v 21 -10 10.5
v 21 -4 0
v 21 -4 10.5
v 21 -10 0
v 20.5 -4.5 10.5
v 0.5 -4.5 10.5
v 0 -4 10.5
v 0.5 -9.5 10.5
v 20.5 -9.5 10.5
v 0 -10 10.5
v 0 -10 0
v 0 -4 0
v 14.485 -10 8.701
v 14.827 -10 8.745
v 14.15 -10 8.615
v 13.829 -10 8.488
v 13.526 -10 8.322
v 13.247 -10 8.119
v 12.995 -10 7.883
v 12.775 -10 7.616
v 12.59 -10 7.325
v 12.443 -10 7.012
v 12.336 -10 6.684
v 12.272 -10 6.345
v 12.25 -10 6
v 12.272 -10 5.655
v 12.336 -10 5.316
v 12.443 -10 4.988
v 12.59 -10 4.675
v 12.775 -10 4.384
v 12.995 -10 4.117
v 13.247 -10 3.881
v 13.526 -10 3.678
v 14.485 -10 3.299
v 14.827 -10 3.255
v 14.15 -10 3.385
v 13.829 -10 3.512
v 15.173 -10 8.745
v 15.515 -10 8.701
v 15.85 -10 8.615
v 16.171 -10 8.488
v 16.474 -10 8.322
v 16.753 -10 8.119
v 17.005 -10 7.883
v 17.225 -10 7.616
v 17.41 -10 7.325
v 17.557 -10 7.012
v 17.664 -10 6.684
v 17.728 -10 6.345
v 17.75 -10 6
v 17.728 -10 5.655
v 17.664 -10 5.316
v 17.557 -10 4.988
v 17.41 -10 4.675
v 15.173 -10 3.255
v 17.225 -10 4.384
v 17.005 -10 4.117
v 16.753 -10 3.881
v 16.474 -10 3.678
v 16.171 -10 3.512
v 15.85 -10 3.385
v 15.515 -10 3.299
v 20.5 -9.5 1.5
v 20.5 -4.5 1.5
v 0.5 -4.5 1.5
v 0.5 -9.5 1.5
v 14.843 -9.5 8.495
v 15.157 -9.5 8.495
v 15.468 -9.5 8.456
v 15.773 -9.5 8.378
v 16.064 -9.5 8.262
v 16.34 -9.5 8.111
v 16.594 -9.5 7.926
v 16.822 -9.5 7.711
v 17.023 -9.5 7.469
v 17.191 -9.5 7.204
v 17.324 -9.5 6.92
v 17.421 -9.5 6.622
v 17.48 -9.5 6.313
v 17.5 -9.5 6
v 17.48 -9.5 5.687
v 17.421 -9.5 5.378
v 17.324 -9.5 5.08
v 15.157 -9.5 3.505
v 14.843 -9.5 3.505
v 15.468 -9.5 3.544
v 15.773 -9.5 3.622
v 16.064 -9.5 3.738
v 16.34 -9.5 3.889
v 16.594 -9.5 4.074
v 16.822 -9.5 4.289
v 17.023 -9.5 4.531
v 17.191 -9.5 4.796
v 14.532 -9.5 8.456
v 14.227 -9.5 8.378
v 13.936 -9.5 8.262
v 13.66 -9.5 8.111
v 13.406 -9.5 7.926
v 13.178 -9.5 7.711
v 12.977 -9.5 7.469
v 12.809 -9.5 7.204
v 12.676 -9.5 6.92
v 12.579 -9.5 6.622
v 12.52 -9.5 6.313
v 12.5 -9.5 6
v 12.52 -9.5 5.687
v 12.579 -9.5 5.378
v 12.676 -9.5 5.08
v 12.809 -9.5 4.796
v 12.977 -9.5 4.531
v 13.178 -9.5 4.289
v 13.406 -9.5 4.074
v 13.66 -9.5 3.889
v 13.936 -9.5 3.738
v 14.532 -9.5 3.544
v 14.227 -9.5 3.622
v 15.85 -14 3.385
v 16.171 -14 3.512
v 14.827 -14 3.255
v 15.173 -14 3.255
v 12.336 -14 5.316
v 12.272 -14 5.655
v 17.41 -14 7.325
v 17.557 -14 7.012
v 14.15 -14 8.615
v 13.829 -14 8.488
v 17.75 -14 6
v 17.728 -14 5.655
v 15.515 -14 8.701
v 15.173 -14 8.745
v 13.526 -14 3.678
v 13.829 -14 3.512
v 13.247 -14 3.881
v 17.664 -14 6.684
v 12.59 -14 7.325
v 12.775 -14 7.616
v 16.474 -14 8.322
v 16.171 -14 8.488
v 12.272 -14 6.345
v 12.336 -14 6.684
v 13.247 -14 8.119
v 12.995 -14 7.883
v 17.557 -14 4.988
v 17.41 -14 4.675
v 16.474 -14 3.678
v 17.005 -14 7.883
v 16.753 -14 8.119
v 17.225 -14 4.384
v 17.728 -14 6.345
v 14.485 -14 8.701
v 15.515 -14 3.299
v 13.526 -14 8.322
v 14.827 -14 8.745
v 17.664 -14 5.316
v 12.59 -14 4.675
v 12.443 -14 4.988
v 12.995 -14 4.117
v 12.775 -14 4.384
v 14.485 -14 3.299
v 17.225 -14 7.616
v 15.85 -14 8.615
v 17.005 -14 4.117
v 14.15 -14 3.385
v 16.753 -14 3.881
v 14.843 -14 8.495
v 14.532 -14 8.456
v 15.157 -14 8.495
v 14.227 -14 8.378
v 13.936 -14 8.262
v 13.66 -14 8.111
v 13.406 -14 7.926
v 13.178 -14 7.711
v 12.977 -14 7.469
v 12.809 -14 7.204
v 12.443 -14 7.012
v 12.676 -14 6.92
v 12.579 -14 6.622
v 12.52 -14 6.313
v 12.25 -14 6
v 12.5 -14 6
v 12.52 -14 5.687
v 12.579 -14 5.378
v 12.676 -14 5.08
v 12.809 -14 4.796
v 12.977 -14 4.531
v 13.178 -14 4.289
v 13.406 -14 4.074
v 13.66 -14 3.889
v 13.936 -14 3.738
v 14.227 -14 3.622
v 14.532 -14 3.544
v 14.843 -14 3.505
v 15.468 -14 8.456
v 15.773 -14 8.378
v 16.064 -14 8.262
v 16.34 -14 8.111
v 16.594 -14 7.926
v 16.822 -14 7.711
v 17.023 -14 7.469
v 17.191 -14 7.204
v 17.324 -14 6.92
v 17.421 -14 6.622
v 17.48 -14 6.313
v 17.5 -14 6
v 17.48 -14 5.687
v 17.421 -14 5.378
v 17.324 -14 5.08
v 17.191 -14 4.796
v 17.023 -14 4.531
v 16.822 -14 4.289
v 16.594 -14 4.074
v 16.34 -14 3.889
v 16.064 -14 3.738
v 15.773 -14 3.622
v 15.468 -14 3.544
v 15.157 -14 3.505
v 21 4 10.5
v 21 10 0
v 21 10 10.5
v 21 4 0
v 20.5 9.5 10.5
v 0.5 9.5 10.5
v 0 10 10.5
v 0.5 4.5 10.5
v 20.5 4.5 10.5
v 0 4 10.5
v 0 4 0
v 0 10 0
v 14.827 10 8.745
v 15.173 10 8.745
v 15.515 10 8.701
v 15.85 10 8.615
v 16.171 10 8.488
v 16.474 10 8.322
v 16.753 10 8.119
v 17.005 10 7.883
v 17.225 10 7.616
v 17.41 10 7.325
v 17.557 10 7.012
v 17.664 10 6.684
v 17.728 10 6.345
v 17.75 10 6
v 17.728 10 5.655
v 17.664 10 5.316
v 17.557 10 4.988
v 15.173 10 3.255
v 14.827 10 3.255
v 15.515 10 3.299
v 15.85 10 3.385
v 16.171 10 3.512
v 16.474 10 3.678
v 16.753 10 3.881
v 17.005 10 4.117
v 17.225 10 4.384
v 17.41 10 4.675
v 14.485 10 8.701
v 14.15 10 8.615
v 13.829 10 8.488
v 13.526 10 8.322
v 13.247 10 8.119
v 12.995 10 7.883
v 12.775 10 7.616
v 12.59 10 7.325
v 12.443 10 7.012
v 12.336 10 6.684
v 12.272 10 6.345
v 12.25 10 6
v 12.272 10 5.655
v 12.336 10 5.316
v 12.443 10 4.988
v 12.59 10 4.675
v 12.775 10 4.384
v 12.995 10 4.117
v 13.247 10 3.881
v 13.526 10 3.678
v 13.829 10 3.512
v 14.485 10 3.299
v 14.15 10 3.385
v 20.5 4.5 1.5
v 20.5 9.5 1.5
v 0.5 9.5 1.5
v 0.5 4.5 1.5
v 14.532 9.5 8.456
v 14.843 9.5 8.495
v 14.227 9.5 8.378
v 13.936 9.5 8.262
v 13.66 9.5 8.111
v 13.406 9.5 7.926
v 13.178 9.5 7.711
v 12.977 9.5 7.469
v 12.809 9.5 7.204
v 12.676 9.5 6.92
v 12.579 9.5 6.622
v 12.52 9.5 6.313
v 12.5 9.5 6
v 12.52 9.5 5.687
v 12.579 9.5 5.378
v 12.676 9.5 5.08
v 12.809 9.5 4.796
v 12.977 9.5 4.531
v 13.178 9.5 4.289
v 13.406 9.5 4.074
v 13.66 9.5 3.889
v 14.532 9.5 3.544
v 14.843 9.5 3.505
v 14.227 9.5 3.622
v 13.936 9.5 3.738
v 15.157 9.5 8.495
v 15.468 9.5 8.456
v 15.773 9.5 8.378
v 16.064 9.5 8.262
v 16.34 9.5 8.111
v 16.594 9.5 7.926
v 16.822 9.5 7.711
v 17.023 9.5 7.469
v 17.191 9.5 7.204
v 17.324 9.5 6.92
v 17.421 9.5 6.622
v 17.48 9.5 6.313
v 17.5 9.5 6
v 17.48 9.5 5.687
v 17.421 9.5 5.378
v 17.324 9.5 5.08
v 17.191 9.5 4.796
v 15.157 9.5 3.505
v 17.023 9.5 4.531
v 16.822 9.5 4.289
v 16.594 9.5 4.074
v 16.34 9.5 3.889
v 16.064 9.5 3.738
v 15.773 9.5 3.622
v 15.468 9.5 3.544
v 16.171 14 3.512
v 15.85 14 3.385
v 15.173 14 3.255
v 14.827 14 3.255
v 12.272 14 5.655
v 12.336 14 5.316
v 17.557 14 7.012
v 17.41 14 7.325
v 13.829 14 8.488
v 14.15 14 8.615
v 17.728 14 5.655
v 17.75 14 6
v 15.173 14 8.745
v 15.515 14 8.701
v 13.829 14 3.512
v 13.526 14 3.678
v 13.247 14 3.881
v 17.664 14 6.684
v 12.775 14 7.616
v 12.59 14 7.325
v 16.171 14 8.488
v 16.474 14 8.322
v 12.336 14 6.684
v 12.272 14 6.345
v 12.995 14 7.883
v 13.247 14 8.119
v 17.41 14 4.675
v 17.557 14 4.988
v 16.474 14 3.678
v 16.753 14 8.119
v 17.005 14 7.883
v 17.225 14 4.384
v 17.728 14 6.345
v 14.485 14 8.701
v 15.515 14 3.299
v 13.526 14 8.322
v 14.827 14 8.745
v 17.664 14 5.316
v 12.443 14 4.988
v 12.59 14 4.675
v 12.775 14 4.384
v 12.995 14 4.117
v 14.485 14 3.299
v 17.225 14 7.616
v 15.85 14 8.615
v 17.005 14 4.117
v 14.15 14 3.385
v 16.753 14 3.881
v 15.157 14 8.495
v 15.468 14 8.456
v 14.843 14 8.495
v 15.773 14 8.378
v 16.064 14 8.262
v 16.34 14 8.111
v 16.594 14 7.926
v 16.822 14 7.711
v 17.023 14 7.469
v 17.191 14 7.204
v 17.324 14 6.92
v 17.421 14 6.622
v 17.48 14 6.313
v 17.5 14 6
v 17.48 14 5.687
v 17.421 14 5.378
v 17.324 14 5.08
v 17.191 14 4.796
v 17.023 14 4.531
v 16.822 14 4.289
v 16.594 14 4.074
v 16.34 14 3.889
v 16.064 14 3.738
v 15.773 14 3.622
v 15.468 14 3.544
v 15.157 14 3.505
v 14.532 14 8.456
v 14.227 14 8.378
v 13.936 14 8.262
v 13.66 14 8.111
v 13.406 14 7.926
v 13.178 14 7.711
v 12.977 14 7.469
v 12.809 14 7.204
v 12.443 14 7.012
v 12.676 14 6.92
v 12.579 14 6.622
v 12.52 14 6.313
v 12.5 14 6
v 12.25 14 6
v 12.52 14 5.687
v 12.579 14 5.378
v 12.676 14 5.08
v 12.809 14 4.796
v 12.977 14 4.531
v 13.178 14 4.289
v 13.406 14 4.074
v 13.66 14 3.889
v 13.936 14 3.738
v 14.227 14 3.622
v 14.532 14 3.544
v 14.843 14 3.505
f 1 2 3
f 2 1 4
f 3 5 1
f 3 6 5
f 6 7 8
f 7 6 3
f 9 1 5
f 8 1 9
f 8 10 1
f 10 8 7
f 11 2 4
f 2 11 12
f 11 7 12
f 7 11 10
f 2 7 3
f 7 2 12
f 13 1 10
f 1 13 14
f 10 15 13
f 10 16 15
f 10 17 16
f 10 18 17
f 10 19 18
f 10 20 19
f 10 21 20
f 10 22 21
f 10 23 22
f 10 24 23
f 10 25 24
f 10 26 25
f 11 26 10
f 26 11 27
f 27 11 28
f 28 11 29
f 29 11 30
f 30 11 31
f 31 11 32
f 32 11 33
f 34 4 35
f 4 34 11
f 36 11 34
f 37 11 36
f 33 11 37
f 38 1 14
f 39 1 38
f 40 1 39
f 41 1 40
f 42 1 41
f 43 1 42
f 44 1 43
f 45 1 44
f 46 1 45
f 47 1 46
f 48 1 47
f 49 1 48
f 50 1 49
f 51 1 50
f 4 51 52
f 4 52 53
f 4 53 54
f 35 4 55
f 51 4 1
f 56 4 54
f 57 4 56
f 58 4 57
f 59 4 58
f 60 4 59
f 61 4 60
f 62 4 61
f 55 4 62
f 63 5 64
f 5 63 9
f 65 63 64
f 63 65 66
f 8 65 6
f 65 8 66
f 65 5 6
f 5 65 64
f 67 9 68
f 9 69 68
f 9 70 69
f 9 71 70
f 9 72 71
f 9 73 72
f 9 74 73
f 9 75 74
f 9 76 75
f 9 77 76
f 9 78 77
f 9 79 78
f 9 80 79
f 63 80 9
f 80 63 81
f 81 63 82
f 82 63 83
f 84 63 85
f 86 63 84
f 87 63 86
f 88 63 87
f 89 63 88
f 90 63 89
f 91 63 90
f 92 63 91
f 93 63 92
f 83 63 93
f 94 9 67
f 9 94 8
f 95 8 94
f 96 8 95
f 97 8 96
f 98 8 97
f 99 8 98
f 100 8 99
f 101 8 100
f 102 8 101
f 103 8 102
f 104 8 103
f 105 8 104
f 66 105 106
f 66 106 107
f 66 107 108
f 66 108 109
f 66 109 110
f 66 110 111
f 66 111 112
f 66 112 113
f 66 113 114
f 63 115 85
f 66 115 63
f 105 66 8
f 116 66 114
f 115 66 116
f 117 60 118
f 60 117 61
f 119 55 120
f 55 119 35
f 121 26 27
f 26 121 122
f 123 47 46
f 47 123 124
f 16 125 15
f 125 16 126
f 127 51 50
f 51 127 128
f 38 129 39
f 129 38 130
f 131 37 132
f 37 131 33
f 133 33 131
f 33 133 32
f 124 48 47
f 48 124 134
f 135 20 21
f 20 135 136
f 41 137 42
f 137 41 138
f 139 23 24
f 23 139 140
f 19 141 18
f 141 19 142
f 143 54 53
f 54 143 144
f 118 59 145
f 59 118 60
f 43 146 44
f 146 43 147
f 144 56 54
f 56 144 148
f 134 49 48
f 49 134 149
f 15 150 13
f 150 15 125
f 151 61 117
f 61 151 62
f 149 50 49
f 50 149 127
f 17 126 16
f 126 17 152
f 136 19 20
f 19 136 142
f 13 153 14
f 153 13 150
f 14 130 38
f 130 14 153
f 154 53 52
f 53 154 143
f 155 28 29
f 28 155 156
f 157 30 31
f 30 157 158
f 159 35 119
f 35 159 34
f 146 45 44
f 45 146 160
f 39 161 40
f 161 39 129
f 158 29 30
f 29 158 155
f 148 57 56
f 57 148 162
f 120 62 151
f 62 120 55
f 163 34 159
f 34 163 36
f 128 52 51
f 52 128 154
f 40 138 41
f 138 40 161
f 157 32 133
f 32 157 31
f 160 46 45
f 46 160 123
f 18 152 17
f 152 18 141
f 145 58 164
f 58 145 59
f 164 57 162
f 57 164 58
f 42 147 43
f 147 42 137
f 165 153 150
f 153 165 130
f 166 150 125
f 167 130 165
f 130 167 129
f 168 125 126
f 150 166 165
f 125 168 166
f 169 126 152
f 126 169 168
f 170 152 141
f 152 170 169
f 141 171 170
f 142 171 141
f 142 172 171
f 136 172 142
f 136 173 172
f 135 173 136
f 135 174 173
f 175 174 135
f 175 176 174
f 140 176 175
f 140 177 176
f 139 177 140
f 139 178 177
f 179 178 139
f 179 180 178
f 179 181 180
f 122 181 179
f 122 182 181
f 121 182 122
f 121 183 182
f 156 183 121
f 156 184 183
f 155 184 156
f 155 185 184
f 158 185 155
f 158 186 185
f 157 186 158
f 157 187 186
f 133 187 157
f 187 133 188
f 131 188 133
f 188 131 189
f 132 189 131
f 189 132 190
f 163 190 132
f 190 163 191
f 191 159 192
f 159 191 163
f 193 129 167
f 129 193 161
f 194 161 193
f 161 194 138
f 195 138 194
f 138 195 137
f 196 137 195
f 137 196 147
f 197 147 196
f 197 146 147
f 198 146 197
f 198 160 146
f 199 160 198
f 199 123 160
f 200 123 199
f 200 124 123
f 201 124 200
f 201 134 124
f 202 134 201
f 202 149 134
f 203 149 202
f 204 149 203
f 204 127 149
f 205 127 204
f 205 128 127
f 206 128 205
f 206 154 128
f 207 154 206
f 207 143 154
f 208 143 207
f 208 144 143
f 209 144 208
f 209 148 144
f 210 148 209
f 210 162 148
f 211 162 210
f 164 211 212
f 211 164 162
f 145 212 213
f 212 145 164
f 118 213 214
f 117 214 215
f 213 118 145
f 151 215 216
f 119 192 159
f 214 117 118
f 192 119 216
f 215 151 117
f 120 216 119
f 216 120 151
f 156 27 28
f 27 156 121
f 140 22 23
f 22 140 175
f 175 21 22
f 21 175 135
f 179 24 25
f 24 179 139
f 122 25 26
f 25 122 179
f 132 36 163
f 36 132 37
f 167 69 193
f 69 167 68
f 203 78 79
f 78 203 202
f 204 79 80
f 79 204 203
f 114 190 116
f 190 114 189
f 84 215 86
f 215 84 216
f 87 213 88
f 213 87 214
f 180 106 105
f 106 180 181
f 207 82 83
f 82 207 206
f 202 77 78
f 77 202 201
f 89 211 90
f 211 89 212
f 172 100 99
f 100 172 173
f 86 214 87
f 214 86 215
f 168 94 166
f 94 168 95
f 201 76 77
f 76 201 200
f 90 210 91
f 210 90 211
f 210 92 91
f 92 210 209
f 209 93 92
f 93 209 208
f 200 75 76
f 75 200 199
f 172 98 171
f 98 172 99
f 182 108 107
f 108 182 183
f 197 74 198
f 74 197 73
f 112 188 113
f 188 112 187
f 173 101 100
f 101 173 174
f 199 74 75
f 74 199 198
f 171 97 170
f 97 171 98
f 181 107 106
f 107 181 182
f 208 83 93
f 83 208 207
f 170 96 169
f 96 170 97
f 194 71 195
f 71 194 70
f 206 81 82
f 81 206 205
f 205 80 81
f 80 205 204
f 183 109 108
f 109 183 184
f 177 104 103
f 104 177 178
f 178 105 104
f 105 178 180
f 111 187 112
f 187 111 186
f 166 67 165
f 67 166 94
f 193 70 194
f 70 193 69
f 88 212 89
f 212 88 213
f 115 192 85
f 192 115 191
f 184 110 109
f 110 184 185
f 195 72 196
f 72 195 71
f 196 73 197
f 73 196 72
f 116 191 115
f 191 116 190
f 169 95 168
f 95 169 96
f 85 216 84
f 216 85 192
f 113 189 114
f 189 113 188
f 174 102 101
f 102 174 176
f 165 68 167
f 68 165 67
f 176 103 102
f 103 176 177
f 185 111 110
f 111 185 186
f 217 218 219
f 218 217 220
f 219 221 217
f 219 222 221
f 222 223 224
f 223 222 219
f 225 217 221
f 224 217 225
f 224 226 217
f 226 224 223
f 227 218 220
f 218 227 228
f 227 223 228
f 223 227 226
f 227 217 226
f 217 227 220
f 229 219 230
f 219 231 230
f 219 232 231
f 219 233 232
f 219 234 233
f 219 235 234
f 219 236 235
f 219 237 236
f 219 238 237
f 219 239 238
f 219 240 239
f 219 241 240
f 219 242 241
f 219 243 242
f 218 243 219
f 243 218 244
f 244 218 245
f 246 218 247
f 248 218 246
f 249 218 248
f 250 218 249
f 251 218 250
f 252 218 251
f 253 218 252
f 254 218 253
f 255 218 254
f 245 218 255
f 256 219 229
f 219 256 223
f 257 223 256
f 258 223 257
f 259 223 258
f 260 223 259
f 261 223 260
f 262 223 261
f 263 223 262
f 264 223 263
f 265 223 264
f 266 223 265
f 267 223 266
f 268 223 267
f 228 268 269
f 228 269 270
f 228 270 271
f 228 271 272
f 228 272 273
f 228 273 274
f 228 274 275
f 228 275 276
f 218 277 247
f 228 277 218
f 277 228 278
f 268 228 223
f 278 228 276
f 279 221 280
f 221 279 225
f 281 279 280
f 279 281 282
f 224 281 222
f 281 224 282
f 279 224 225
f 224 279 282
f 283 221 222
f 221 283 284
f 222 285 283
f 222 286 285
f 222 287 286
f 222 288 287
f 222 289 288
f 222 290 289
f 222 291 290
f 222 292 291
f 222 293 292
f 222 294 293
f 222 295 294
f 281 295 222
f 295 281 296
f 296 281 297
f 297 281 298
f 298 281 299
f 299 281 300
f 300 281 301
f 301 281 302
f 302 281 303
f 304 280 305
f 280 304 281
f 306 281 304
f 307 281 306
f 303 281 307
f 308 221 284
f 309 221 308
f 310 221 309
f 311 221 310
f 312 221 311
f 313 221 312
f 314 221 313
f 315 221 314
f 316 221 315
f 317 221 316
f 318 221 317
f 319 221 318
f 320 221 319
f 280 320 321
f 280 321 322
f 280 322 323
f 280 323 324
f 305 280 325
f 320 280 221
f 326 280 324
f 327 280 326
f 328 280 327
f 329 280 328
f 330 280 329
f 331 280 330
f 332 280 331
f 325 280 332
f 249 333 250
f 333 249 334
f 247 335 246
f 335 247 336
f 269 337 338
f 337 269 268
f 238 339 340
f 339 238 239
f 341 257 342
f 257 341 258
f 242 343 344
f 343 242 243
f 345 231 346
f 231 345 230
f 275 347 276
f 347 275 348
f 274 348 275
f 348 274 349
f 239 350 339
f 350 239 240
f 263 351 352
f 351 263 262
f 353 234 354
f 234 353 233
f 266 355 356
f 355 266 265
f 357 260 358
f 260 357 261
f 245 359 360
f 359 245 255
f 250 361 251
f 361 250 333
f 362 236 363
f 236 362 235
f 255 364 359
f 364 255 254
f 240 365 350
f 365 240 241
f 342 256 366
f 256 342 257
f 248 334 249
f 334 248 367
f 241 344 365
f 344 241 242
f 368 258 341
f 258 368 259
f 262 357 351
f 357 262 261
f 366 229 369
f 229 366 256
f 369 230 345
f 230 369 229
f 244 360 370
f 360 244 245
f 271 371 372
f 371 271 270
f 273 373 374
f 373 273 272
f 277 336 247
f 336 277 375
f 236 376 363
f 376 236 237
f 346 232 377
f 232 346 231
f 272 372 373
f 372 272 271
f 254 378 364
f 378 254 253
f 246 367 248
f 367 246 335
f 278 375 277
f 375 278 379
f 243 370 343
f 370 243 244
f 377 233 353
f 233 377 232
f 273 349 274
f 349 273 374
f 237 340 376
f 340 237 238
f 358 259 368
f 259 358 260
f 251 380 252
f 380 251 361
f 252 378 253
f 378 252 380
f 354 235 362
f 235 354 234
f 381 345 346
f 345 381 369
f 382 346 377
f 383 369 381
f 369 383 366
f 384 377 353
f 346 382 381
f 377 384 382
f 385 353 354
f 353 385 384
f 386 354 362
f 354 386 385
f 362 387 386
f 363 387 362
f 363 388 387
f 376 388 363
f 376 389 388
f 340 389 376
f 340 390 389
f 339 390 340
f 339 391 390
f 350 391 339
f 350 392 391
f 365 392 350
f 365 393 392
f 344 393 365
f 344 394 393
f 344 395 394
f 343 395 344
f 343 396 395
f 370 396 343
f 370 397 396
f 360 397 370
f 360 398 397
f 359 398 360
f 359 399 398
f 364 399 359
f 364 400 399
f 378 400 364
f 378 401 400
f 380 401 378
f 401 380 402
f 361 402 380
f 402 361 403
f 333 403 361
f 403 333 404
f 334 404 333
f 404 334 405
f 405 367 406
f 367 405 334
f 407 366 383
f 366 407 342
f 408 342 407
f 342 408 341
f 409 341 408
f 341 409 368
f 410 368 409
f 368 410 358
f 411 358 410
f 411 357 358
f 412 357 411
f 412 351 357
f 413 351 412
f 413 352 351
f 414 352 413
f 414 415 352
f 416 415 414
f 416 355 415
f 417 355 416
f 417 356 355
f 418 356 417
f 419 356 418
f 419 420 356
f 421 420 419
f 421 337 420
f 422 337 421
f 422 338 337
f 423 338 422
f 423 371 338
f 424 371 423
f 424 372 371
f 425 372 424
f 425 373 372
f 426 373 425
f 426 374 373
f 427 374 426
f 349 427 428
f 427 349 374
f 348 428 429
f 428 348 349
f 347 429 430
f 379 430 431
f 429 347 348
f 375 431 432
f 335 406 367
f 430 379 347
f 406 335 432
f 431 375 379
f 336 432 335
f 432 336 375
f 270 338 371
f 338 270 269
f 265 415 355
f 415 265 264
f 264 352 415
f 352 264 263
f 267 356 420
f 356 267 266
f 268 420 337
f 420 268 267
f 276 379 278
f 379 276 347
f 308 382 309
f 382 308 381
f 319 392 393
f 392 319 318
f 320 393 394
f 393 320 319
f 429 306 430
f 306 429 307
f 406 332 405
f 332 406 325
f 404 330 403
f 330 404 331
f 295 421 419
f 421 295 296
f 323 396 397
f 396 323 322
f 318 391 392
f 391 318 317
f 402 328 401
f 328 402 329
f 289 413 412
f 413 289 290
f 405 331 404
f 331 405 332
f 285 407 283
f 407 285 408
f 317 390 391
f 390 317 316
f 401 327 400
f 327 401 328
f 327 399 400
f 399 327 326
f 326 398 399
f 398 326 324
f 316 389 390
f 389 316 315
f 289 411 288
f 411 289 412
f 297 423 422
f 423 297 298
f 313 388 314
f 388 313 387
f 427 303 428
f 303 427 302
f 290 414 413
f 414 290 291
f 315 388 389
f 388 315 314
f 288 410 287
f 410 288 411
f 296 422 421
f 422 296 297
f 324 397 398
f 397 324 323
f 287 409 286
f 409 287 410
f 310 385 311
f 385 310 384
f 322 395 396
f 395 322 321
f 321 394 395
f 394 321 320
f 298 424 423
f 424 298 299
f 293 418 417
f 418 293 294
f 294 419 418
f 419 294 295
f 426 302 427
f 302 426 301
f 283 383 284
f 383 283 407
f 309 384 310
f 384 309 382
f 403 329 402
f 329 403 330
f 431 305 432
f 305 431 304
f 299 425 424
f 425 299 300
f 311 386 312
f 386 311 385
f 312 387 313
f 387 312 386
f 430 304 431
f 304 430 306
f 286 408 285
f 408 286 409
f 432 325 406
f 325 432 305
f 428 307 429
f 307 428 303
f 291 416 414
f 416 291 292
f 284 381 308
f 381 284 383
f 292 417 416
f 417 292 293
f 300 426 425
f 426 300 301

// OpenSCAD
//Different print configurations.
Configuration = "0"; // [0:Both,1:Left Only,2:Right Only]
//Measured from the bottom inside to the top outside of the body. (Not the ear hook!)
Hearing_Aid_Height = 20;
//Measured from the bottom inside to the bottom ouside of the body.
Hearing_Aid_Length = 10;
//Measured from the thickest point on the body between the left side and the right side of the body.
Hearing_Aid_Width = 5;
//Measured from the bottom inside of the body to the microphone. 
Microphone_Location = 15;
//Average betwen the largest diameter and the inside diameter of the rubberized ear piece.
Headphone_Diameter = 5;
//Determines the strength of the part.
Shell_Distance = 0.5;

module solid()
{
    difference()
    {
    union()
    {
        translate([Microphone_Location,-2,6]) rotate ([90,0,0]) cylinder (h = 4, r=(Headphone_Diameter+Shell_Distance)/2, center = true, $fn=50);
        difference()
        {
            cube([Hearing_Aid_Height + Shell_Distance*2,Hearing_Aid_Width + Shell_Distance*2,Hearing_Aid_Length + Shell_Distance]);
            translate([Shell_Distance,Shell_Distance,Shell_Distance+1])cube([Hearing_Aid_Height,Hearing_Aid_Width,  Hearing_Aid_Length]);
        }
    }
        translate([Microphone_Location,-2,6]) rotate ([90,0,0]) cylinder (h = 7, r=Headphone_Diameter/2, center = true, $fn=50);
    }
}

module print_solid()
{
	if (Configuration == "0")
    {
		Both();
	}
    else 
    if (Configuration == "1")
    {
		Left();
    } 
    else 
    if (Configuration == "2")
    {
        Right();
    }
    else
    {
		Both();
	}
}
module Both()
{
    translate([0,-5-Hearing_Aid_Width,0]) solid();
    mirror([0,1,0]) translate([0,-5-Hearing_Aid_Width,0]) solid();
}
module Left()
{
    solid();
}
module Right()
{
    mirror([0,1,0])  solid();
}
print_solid();
